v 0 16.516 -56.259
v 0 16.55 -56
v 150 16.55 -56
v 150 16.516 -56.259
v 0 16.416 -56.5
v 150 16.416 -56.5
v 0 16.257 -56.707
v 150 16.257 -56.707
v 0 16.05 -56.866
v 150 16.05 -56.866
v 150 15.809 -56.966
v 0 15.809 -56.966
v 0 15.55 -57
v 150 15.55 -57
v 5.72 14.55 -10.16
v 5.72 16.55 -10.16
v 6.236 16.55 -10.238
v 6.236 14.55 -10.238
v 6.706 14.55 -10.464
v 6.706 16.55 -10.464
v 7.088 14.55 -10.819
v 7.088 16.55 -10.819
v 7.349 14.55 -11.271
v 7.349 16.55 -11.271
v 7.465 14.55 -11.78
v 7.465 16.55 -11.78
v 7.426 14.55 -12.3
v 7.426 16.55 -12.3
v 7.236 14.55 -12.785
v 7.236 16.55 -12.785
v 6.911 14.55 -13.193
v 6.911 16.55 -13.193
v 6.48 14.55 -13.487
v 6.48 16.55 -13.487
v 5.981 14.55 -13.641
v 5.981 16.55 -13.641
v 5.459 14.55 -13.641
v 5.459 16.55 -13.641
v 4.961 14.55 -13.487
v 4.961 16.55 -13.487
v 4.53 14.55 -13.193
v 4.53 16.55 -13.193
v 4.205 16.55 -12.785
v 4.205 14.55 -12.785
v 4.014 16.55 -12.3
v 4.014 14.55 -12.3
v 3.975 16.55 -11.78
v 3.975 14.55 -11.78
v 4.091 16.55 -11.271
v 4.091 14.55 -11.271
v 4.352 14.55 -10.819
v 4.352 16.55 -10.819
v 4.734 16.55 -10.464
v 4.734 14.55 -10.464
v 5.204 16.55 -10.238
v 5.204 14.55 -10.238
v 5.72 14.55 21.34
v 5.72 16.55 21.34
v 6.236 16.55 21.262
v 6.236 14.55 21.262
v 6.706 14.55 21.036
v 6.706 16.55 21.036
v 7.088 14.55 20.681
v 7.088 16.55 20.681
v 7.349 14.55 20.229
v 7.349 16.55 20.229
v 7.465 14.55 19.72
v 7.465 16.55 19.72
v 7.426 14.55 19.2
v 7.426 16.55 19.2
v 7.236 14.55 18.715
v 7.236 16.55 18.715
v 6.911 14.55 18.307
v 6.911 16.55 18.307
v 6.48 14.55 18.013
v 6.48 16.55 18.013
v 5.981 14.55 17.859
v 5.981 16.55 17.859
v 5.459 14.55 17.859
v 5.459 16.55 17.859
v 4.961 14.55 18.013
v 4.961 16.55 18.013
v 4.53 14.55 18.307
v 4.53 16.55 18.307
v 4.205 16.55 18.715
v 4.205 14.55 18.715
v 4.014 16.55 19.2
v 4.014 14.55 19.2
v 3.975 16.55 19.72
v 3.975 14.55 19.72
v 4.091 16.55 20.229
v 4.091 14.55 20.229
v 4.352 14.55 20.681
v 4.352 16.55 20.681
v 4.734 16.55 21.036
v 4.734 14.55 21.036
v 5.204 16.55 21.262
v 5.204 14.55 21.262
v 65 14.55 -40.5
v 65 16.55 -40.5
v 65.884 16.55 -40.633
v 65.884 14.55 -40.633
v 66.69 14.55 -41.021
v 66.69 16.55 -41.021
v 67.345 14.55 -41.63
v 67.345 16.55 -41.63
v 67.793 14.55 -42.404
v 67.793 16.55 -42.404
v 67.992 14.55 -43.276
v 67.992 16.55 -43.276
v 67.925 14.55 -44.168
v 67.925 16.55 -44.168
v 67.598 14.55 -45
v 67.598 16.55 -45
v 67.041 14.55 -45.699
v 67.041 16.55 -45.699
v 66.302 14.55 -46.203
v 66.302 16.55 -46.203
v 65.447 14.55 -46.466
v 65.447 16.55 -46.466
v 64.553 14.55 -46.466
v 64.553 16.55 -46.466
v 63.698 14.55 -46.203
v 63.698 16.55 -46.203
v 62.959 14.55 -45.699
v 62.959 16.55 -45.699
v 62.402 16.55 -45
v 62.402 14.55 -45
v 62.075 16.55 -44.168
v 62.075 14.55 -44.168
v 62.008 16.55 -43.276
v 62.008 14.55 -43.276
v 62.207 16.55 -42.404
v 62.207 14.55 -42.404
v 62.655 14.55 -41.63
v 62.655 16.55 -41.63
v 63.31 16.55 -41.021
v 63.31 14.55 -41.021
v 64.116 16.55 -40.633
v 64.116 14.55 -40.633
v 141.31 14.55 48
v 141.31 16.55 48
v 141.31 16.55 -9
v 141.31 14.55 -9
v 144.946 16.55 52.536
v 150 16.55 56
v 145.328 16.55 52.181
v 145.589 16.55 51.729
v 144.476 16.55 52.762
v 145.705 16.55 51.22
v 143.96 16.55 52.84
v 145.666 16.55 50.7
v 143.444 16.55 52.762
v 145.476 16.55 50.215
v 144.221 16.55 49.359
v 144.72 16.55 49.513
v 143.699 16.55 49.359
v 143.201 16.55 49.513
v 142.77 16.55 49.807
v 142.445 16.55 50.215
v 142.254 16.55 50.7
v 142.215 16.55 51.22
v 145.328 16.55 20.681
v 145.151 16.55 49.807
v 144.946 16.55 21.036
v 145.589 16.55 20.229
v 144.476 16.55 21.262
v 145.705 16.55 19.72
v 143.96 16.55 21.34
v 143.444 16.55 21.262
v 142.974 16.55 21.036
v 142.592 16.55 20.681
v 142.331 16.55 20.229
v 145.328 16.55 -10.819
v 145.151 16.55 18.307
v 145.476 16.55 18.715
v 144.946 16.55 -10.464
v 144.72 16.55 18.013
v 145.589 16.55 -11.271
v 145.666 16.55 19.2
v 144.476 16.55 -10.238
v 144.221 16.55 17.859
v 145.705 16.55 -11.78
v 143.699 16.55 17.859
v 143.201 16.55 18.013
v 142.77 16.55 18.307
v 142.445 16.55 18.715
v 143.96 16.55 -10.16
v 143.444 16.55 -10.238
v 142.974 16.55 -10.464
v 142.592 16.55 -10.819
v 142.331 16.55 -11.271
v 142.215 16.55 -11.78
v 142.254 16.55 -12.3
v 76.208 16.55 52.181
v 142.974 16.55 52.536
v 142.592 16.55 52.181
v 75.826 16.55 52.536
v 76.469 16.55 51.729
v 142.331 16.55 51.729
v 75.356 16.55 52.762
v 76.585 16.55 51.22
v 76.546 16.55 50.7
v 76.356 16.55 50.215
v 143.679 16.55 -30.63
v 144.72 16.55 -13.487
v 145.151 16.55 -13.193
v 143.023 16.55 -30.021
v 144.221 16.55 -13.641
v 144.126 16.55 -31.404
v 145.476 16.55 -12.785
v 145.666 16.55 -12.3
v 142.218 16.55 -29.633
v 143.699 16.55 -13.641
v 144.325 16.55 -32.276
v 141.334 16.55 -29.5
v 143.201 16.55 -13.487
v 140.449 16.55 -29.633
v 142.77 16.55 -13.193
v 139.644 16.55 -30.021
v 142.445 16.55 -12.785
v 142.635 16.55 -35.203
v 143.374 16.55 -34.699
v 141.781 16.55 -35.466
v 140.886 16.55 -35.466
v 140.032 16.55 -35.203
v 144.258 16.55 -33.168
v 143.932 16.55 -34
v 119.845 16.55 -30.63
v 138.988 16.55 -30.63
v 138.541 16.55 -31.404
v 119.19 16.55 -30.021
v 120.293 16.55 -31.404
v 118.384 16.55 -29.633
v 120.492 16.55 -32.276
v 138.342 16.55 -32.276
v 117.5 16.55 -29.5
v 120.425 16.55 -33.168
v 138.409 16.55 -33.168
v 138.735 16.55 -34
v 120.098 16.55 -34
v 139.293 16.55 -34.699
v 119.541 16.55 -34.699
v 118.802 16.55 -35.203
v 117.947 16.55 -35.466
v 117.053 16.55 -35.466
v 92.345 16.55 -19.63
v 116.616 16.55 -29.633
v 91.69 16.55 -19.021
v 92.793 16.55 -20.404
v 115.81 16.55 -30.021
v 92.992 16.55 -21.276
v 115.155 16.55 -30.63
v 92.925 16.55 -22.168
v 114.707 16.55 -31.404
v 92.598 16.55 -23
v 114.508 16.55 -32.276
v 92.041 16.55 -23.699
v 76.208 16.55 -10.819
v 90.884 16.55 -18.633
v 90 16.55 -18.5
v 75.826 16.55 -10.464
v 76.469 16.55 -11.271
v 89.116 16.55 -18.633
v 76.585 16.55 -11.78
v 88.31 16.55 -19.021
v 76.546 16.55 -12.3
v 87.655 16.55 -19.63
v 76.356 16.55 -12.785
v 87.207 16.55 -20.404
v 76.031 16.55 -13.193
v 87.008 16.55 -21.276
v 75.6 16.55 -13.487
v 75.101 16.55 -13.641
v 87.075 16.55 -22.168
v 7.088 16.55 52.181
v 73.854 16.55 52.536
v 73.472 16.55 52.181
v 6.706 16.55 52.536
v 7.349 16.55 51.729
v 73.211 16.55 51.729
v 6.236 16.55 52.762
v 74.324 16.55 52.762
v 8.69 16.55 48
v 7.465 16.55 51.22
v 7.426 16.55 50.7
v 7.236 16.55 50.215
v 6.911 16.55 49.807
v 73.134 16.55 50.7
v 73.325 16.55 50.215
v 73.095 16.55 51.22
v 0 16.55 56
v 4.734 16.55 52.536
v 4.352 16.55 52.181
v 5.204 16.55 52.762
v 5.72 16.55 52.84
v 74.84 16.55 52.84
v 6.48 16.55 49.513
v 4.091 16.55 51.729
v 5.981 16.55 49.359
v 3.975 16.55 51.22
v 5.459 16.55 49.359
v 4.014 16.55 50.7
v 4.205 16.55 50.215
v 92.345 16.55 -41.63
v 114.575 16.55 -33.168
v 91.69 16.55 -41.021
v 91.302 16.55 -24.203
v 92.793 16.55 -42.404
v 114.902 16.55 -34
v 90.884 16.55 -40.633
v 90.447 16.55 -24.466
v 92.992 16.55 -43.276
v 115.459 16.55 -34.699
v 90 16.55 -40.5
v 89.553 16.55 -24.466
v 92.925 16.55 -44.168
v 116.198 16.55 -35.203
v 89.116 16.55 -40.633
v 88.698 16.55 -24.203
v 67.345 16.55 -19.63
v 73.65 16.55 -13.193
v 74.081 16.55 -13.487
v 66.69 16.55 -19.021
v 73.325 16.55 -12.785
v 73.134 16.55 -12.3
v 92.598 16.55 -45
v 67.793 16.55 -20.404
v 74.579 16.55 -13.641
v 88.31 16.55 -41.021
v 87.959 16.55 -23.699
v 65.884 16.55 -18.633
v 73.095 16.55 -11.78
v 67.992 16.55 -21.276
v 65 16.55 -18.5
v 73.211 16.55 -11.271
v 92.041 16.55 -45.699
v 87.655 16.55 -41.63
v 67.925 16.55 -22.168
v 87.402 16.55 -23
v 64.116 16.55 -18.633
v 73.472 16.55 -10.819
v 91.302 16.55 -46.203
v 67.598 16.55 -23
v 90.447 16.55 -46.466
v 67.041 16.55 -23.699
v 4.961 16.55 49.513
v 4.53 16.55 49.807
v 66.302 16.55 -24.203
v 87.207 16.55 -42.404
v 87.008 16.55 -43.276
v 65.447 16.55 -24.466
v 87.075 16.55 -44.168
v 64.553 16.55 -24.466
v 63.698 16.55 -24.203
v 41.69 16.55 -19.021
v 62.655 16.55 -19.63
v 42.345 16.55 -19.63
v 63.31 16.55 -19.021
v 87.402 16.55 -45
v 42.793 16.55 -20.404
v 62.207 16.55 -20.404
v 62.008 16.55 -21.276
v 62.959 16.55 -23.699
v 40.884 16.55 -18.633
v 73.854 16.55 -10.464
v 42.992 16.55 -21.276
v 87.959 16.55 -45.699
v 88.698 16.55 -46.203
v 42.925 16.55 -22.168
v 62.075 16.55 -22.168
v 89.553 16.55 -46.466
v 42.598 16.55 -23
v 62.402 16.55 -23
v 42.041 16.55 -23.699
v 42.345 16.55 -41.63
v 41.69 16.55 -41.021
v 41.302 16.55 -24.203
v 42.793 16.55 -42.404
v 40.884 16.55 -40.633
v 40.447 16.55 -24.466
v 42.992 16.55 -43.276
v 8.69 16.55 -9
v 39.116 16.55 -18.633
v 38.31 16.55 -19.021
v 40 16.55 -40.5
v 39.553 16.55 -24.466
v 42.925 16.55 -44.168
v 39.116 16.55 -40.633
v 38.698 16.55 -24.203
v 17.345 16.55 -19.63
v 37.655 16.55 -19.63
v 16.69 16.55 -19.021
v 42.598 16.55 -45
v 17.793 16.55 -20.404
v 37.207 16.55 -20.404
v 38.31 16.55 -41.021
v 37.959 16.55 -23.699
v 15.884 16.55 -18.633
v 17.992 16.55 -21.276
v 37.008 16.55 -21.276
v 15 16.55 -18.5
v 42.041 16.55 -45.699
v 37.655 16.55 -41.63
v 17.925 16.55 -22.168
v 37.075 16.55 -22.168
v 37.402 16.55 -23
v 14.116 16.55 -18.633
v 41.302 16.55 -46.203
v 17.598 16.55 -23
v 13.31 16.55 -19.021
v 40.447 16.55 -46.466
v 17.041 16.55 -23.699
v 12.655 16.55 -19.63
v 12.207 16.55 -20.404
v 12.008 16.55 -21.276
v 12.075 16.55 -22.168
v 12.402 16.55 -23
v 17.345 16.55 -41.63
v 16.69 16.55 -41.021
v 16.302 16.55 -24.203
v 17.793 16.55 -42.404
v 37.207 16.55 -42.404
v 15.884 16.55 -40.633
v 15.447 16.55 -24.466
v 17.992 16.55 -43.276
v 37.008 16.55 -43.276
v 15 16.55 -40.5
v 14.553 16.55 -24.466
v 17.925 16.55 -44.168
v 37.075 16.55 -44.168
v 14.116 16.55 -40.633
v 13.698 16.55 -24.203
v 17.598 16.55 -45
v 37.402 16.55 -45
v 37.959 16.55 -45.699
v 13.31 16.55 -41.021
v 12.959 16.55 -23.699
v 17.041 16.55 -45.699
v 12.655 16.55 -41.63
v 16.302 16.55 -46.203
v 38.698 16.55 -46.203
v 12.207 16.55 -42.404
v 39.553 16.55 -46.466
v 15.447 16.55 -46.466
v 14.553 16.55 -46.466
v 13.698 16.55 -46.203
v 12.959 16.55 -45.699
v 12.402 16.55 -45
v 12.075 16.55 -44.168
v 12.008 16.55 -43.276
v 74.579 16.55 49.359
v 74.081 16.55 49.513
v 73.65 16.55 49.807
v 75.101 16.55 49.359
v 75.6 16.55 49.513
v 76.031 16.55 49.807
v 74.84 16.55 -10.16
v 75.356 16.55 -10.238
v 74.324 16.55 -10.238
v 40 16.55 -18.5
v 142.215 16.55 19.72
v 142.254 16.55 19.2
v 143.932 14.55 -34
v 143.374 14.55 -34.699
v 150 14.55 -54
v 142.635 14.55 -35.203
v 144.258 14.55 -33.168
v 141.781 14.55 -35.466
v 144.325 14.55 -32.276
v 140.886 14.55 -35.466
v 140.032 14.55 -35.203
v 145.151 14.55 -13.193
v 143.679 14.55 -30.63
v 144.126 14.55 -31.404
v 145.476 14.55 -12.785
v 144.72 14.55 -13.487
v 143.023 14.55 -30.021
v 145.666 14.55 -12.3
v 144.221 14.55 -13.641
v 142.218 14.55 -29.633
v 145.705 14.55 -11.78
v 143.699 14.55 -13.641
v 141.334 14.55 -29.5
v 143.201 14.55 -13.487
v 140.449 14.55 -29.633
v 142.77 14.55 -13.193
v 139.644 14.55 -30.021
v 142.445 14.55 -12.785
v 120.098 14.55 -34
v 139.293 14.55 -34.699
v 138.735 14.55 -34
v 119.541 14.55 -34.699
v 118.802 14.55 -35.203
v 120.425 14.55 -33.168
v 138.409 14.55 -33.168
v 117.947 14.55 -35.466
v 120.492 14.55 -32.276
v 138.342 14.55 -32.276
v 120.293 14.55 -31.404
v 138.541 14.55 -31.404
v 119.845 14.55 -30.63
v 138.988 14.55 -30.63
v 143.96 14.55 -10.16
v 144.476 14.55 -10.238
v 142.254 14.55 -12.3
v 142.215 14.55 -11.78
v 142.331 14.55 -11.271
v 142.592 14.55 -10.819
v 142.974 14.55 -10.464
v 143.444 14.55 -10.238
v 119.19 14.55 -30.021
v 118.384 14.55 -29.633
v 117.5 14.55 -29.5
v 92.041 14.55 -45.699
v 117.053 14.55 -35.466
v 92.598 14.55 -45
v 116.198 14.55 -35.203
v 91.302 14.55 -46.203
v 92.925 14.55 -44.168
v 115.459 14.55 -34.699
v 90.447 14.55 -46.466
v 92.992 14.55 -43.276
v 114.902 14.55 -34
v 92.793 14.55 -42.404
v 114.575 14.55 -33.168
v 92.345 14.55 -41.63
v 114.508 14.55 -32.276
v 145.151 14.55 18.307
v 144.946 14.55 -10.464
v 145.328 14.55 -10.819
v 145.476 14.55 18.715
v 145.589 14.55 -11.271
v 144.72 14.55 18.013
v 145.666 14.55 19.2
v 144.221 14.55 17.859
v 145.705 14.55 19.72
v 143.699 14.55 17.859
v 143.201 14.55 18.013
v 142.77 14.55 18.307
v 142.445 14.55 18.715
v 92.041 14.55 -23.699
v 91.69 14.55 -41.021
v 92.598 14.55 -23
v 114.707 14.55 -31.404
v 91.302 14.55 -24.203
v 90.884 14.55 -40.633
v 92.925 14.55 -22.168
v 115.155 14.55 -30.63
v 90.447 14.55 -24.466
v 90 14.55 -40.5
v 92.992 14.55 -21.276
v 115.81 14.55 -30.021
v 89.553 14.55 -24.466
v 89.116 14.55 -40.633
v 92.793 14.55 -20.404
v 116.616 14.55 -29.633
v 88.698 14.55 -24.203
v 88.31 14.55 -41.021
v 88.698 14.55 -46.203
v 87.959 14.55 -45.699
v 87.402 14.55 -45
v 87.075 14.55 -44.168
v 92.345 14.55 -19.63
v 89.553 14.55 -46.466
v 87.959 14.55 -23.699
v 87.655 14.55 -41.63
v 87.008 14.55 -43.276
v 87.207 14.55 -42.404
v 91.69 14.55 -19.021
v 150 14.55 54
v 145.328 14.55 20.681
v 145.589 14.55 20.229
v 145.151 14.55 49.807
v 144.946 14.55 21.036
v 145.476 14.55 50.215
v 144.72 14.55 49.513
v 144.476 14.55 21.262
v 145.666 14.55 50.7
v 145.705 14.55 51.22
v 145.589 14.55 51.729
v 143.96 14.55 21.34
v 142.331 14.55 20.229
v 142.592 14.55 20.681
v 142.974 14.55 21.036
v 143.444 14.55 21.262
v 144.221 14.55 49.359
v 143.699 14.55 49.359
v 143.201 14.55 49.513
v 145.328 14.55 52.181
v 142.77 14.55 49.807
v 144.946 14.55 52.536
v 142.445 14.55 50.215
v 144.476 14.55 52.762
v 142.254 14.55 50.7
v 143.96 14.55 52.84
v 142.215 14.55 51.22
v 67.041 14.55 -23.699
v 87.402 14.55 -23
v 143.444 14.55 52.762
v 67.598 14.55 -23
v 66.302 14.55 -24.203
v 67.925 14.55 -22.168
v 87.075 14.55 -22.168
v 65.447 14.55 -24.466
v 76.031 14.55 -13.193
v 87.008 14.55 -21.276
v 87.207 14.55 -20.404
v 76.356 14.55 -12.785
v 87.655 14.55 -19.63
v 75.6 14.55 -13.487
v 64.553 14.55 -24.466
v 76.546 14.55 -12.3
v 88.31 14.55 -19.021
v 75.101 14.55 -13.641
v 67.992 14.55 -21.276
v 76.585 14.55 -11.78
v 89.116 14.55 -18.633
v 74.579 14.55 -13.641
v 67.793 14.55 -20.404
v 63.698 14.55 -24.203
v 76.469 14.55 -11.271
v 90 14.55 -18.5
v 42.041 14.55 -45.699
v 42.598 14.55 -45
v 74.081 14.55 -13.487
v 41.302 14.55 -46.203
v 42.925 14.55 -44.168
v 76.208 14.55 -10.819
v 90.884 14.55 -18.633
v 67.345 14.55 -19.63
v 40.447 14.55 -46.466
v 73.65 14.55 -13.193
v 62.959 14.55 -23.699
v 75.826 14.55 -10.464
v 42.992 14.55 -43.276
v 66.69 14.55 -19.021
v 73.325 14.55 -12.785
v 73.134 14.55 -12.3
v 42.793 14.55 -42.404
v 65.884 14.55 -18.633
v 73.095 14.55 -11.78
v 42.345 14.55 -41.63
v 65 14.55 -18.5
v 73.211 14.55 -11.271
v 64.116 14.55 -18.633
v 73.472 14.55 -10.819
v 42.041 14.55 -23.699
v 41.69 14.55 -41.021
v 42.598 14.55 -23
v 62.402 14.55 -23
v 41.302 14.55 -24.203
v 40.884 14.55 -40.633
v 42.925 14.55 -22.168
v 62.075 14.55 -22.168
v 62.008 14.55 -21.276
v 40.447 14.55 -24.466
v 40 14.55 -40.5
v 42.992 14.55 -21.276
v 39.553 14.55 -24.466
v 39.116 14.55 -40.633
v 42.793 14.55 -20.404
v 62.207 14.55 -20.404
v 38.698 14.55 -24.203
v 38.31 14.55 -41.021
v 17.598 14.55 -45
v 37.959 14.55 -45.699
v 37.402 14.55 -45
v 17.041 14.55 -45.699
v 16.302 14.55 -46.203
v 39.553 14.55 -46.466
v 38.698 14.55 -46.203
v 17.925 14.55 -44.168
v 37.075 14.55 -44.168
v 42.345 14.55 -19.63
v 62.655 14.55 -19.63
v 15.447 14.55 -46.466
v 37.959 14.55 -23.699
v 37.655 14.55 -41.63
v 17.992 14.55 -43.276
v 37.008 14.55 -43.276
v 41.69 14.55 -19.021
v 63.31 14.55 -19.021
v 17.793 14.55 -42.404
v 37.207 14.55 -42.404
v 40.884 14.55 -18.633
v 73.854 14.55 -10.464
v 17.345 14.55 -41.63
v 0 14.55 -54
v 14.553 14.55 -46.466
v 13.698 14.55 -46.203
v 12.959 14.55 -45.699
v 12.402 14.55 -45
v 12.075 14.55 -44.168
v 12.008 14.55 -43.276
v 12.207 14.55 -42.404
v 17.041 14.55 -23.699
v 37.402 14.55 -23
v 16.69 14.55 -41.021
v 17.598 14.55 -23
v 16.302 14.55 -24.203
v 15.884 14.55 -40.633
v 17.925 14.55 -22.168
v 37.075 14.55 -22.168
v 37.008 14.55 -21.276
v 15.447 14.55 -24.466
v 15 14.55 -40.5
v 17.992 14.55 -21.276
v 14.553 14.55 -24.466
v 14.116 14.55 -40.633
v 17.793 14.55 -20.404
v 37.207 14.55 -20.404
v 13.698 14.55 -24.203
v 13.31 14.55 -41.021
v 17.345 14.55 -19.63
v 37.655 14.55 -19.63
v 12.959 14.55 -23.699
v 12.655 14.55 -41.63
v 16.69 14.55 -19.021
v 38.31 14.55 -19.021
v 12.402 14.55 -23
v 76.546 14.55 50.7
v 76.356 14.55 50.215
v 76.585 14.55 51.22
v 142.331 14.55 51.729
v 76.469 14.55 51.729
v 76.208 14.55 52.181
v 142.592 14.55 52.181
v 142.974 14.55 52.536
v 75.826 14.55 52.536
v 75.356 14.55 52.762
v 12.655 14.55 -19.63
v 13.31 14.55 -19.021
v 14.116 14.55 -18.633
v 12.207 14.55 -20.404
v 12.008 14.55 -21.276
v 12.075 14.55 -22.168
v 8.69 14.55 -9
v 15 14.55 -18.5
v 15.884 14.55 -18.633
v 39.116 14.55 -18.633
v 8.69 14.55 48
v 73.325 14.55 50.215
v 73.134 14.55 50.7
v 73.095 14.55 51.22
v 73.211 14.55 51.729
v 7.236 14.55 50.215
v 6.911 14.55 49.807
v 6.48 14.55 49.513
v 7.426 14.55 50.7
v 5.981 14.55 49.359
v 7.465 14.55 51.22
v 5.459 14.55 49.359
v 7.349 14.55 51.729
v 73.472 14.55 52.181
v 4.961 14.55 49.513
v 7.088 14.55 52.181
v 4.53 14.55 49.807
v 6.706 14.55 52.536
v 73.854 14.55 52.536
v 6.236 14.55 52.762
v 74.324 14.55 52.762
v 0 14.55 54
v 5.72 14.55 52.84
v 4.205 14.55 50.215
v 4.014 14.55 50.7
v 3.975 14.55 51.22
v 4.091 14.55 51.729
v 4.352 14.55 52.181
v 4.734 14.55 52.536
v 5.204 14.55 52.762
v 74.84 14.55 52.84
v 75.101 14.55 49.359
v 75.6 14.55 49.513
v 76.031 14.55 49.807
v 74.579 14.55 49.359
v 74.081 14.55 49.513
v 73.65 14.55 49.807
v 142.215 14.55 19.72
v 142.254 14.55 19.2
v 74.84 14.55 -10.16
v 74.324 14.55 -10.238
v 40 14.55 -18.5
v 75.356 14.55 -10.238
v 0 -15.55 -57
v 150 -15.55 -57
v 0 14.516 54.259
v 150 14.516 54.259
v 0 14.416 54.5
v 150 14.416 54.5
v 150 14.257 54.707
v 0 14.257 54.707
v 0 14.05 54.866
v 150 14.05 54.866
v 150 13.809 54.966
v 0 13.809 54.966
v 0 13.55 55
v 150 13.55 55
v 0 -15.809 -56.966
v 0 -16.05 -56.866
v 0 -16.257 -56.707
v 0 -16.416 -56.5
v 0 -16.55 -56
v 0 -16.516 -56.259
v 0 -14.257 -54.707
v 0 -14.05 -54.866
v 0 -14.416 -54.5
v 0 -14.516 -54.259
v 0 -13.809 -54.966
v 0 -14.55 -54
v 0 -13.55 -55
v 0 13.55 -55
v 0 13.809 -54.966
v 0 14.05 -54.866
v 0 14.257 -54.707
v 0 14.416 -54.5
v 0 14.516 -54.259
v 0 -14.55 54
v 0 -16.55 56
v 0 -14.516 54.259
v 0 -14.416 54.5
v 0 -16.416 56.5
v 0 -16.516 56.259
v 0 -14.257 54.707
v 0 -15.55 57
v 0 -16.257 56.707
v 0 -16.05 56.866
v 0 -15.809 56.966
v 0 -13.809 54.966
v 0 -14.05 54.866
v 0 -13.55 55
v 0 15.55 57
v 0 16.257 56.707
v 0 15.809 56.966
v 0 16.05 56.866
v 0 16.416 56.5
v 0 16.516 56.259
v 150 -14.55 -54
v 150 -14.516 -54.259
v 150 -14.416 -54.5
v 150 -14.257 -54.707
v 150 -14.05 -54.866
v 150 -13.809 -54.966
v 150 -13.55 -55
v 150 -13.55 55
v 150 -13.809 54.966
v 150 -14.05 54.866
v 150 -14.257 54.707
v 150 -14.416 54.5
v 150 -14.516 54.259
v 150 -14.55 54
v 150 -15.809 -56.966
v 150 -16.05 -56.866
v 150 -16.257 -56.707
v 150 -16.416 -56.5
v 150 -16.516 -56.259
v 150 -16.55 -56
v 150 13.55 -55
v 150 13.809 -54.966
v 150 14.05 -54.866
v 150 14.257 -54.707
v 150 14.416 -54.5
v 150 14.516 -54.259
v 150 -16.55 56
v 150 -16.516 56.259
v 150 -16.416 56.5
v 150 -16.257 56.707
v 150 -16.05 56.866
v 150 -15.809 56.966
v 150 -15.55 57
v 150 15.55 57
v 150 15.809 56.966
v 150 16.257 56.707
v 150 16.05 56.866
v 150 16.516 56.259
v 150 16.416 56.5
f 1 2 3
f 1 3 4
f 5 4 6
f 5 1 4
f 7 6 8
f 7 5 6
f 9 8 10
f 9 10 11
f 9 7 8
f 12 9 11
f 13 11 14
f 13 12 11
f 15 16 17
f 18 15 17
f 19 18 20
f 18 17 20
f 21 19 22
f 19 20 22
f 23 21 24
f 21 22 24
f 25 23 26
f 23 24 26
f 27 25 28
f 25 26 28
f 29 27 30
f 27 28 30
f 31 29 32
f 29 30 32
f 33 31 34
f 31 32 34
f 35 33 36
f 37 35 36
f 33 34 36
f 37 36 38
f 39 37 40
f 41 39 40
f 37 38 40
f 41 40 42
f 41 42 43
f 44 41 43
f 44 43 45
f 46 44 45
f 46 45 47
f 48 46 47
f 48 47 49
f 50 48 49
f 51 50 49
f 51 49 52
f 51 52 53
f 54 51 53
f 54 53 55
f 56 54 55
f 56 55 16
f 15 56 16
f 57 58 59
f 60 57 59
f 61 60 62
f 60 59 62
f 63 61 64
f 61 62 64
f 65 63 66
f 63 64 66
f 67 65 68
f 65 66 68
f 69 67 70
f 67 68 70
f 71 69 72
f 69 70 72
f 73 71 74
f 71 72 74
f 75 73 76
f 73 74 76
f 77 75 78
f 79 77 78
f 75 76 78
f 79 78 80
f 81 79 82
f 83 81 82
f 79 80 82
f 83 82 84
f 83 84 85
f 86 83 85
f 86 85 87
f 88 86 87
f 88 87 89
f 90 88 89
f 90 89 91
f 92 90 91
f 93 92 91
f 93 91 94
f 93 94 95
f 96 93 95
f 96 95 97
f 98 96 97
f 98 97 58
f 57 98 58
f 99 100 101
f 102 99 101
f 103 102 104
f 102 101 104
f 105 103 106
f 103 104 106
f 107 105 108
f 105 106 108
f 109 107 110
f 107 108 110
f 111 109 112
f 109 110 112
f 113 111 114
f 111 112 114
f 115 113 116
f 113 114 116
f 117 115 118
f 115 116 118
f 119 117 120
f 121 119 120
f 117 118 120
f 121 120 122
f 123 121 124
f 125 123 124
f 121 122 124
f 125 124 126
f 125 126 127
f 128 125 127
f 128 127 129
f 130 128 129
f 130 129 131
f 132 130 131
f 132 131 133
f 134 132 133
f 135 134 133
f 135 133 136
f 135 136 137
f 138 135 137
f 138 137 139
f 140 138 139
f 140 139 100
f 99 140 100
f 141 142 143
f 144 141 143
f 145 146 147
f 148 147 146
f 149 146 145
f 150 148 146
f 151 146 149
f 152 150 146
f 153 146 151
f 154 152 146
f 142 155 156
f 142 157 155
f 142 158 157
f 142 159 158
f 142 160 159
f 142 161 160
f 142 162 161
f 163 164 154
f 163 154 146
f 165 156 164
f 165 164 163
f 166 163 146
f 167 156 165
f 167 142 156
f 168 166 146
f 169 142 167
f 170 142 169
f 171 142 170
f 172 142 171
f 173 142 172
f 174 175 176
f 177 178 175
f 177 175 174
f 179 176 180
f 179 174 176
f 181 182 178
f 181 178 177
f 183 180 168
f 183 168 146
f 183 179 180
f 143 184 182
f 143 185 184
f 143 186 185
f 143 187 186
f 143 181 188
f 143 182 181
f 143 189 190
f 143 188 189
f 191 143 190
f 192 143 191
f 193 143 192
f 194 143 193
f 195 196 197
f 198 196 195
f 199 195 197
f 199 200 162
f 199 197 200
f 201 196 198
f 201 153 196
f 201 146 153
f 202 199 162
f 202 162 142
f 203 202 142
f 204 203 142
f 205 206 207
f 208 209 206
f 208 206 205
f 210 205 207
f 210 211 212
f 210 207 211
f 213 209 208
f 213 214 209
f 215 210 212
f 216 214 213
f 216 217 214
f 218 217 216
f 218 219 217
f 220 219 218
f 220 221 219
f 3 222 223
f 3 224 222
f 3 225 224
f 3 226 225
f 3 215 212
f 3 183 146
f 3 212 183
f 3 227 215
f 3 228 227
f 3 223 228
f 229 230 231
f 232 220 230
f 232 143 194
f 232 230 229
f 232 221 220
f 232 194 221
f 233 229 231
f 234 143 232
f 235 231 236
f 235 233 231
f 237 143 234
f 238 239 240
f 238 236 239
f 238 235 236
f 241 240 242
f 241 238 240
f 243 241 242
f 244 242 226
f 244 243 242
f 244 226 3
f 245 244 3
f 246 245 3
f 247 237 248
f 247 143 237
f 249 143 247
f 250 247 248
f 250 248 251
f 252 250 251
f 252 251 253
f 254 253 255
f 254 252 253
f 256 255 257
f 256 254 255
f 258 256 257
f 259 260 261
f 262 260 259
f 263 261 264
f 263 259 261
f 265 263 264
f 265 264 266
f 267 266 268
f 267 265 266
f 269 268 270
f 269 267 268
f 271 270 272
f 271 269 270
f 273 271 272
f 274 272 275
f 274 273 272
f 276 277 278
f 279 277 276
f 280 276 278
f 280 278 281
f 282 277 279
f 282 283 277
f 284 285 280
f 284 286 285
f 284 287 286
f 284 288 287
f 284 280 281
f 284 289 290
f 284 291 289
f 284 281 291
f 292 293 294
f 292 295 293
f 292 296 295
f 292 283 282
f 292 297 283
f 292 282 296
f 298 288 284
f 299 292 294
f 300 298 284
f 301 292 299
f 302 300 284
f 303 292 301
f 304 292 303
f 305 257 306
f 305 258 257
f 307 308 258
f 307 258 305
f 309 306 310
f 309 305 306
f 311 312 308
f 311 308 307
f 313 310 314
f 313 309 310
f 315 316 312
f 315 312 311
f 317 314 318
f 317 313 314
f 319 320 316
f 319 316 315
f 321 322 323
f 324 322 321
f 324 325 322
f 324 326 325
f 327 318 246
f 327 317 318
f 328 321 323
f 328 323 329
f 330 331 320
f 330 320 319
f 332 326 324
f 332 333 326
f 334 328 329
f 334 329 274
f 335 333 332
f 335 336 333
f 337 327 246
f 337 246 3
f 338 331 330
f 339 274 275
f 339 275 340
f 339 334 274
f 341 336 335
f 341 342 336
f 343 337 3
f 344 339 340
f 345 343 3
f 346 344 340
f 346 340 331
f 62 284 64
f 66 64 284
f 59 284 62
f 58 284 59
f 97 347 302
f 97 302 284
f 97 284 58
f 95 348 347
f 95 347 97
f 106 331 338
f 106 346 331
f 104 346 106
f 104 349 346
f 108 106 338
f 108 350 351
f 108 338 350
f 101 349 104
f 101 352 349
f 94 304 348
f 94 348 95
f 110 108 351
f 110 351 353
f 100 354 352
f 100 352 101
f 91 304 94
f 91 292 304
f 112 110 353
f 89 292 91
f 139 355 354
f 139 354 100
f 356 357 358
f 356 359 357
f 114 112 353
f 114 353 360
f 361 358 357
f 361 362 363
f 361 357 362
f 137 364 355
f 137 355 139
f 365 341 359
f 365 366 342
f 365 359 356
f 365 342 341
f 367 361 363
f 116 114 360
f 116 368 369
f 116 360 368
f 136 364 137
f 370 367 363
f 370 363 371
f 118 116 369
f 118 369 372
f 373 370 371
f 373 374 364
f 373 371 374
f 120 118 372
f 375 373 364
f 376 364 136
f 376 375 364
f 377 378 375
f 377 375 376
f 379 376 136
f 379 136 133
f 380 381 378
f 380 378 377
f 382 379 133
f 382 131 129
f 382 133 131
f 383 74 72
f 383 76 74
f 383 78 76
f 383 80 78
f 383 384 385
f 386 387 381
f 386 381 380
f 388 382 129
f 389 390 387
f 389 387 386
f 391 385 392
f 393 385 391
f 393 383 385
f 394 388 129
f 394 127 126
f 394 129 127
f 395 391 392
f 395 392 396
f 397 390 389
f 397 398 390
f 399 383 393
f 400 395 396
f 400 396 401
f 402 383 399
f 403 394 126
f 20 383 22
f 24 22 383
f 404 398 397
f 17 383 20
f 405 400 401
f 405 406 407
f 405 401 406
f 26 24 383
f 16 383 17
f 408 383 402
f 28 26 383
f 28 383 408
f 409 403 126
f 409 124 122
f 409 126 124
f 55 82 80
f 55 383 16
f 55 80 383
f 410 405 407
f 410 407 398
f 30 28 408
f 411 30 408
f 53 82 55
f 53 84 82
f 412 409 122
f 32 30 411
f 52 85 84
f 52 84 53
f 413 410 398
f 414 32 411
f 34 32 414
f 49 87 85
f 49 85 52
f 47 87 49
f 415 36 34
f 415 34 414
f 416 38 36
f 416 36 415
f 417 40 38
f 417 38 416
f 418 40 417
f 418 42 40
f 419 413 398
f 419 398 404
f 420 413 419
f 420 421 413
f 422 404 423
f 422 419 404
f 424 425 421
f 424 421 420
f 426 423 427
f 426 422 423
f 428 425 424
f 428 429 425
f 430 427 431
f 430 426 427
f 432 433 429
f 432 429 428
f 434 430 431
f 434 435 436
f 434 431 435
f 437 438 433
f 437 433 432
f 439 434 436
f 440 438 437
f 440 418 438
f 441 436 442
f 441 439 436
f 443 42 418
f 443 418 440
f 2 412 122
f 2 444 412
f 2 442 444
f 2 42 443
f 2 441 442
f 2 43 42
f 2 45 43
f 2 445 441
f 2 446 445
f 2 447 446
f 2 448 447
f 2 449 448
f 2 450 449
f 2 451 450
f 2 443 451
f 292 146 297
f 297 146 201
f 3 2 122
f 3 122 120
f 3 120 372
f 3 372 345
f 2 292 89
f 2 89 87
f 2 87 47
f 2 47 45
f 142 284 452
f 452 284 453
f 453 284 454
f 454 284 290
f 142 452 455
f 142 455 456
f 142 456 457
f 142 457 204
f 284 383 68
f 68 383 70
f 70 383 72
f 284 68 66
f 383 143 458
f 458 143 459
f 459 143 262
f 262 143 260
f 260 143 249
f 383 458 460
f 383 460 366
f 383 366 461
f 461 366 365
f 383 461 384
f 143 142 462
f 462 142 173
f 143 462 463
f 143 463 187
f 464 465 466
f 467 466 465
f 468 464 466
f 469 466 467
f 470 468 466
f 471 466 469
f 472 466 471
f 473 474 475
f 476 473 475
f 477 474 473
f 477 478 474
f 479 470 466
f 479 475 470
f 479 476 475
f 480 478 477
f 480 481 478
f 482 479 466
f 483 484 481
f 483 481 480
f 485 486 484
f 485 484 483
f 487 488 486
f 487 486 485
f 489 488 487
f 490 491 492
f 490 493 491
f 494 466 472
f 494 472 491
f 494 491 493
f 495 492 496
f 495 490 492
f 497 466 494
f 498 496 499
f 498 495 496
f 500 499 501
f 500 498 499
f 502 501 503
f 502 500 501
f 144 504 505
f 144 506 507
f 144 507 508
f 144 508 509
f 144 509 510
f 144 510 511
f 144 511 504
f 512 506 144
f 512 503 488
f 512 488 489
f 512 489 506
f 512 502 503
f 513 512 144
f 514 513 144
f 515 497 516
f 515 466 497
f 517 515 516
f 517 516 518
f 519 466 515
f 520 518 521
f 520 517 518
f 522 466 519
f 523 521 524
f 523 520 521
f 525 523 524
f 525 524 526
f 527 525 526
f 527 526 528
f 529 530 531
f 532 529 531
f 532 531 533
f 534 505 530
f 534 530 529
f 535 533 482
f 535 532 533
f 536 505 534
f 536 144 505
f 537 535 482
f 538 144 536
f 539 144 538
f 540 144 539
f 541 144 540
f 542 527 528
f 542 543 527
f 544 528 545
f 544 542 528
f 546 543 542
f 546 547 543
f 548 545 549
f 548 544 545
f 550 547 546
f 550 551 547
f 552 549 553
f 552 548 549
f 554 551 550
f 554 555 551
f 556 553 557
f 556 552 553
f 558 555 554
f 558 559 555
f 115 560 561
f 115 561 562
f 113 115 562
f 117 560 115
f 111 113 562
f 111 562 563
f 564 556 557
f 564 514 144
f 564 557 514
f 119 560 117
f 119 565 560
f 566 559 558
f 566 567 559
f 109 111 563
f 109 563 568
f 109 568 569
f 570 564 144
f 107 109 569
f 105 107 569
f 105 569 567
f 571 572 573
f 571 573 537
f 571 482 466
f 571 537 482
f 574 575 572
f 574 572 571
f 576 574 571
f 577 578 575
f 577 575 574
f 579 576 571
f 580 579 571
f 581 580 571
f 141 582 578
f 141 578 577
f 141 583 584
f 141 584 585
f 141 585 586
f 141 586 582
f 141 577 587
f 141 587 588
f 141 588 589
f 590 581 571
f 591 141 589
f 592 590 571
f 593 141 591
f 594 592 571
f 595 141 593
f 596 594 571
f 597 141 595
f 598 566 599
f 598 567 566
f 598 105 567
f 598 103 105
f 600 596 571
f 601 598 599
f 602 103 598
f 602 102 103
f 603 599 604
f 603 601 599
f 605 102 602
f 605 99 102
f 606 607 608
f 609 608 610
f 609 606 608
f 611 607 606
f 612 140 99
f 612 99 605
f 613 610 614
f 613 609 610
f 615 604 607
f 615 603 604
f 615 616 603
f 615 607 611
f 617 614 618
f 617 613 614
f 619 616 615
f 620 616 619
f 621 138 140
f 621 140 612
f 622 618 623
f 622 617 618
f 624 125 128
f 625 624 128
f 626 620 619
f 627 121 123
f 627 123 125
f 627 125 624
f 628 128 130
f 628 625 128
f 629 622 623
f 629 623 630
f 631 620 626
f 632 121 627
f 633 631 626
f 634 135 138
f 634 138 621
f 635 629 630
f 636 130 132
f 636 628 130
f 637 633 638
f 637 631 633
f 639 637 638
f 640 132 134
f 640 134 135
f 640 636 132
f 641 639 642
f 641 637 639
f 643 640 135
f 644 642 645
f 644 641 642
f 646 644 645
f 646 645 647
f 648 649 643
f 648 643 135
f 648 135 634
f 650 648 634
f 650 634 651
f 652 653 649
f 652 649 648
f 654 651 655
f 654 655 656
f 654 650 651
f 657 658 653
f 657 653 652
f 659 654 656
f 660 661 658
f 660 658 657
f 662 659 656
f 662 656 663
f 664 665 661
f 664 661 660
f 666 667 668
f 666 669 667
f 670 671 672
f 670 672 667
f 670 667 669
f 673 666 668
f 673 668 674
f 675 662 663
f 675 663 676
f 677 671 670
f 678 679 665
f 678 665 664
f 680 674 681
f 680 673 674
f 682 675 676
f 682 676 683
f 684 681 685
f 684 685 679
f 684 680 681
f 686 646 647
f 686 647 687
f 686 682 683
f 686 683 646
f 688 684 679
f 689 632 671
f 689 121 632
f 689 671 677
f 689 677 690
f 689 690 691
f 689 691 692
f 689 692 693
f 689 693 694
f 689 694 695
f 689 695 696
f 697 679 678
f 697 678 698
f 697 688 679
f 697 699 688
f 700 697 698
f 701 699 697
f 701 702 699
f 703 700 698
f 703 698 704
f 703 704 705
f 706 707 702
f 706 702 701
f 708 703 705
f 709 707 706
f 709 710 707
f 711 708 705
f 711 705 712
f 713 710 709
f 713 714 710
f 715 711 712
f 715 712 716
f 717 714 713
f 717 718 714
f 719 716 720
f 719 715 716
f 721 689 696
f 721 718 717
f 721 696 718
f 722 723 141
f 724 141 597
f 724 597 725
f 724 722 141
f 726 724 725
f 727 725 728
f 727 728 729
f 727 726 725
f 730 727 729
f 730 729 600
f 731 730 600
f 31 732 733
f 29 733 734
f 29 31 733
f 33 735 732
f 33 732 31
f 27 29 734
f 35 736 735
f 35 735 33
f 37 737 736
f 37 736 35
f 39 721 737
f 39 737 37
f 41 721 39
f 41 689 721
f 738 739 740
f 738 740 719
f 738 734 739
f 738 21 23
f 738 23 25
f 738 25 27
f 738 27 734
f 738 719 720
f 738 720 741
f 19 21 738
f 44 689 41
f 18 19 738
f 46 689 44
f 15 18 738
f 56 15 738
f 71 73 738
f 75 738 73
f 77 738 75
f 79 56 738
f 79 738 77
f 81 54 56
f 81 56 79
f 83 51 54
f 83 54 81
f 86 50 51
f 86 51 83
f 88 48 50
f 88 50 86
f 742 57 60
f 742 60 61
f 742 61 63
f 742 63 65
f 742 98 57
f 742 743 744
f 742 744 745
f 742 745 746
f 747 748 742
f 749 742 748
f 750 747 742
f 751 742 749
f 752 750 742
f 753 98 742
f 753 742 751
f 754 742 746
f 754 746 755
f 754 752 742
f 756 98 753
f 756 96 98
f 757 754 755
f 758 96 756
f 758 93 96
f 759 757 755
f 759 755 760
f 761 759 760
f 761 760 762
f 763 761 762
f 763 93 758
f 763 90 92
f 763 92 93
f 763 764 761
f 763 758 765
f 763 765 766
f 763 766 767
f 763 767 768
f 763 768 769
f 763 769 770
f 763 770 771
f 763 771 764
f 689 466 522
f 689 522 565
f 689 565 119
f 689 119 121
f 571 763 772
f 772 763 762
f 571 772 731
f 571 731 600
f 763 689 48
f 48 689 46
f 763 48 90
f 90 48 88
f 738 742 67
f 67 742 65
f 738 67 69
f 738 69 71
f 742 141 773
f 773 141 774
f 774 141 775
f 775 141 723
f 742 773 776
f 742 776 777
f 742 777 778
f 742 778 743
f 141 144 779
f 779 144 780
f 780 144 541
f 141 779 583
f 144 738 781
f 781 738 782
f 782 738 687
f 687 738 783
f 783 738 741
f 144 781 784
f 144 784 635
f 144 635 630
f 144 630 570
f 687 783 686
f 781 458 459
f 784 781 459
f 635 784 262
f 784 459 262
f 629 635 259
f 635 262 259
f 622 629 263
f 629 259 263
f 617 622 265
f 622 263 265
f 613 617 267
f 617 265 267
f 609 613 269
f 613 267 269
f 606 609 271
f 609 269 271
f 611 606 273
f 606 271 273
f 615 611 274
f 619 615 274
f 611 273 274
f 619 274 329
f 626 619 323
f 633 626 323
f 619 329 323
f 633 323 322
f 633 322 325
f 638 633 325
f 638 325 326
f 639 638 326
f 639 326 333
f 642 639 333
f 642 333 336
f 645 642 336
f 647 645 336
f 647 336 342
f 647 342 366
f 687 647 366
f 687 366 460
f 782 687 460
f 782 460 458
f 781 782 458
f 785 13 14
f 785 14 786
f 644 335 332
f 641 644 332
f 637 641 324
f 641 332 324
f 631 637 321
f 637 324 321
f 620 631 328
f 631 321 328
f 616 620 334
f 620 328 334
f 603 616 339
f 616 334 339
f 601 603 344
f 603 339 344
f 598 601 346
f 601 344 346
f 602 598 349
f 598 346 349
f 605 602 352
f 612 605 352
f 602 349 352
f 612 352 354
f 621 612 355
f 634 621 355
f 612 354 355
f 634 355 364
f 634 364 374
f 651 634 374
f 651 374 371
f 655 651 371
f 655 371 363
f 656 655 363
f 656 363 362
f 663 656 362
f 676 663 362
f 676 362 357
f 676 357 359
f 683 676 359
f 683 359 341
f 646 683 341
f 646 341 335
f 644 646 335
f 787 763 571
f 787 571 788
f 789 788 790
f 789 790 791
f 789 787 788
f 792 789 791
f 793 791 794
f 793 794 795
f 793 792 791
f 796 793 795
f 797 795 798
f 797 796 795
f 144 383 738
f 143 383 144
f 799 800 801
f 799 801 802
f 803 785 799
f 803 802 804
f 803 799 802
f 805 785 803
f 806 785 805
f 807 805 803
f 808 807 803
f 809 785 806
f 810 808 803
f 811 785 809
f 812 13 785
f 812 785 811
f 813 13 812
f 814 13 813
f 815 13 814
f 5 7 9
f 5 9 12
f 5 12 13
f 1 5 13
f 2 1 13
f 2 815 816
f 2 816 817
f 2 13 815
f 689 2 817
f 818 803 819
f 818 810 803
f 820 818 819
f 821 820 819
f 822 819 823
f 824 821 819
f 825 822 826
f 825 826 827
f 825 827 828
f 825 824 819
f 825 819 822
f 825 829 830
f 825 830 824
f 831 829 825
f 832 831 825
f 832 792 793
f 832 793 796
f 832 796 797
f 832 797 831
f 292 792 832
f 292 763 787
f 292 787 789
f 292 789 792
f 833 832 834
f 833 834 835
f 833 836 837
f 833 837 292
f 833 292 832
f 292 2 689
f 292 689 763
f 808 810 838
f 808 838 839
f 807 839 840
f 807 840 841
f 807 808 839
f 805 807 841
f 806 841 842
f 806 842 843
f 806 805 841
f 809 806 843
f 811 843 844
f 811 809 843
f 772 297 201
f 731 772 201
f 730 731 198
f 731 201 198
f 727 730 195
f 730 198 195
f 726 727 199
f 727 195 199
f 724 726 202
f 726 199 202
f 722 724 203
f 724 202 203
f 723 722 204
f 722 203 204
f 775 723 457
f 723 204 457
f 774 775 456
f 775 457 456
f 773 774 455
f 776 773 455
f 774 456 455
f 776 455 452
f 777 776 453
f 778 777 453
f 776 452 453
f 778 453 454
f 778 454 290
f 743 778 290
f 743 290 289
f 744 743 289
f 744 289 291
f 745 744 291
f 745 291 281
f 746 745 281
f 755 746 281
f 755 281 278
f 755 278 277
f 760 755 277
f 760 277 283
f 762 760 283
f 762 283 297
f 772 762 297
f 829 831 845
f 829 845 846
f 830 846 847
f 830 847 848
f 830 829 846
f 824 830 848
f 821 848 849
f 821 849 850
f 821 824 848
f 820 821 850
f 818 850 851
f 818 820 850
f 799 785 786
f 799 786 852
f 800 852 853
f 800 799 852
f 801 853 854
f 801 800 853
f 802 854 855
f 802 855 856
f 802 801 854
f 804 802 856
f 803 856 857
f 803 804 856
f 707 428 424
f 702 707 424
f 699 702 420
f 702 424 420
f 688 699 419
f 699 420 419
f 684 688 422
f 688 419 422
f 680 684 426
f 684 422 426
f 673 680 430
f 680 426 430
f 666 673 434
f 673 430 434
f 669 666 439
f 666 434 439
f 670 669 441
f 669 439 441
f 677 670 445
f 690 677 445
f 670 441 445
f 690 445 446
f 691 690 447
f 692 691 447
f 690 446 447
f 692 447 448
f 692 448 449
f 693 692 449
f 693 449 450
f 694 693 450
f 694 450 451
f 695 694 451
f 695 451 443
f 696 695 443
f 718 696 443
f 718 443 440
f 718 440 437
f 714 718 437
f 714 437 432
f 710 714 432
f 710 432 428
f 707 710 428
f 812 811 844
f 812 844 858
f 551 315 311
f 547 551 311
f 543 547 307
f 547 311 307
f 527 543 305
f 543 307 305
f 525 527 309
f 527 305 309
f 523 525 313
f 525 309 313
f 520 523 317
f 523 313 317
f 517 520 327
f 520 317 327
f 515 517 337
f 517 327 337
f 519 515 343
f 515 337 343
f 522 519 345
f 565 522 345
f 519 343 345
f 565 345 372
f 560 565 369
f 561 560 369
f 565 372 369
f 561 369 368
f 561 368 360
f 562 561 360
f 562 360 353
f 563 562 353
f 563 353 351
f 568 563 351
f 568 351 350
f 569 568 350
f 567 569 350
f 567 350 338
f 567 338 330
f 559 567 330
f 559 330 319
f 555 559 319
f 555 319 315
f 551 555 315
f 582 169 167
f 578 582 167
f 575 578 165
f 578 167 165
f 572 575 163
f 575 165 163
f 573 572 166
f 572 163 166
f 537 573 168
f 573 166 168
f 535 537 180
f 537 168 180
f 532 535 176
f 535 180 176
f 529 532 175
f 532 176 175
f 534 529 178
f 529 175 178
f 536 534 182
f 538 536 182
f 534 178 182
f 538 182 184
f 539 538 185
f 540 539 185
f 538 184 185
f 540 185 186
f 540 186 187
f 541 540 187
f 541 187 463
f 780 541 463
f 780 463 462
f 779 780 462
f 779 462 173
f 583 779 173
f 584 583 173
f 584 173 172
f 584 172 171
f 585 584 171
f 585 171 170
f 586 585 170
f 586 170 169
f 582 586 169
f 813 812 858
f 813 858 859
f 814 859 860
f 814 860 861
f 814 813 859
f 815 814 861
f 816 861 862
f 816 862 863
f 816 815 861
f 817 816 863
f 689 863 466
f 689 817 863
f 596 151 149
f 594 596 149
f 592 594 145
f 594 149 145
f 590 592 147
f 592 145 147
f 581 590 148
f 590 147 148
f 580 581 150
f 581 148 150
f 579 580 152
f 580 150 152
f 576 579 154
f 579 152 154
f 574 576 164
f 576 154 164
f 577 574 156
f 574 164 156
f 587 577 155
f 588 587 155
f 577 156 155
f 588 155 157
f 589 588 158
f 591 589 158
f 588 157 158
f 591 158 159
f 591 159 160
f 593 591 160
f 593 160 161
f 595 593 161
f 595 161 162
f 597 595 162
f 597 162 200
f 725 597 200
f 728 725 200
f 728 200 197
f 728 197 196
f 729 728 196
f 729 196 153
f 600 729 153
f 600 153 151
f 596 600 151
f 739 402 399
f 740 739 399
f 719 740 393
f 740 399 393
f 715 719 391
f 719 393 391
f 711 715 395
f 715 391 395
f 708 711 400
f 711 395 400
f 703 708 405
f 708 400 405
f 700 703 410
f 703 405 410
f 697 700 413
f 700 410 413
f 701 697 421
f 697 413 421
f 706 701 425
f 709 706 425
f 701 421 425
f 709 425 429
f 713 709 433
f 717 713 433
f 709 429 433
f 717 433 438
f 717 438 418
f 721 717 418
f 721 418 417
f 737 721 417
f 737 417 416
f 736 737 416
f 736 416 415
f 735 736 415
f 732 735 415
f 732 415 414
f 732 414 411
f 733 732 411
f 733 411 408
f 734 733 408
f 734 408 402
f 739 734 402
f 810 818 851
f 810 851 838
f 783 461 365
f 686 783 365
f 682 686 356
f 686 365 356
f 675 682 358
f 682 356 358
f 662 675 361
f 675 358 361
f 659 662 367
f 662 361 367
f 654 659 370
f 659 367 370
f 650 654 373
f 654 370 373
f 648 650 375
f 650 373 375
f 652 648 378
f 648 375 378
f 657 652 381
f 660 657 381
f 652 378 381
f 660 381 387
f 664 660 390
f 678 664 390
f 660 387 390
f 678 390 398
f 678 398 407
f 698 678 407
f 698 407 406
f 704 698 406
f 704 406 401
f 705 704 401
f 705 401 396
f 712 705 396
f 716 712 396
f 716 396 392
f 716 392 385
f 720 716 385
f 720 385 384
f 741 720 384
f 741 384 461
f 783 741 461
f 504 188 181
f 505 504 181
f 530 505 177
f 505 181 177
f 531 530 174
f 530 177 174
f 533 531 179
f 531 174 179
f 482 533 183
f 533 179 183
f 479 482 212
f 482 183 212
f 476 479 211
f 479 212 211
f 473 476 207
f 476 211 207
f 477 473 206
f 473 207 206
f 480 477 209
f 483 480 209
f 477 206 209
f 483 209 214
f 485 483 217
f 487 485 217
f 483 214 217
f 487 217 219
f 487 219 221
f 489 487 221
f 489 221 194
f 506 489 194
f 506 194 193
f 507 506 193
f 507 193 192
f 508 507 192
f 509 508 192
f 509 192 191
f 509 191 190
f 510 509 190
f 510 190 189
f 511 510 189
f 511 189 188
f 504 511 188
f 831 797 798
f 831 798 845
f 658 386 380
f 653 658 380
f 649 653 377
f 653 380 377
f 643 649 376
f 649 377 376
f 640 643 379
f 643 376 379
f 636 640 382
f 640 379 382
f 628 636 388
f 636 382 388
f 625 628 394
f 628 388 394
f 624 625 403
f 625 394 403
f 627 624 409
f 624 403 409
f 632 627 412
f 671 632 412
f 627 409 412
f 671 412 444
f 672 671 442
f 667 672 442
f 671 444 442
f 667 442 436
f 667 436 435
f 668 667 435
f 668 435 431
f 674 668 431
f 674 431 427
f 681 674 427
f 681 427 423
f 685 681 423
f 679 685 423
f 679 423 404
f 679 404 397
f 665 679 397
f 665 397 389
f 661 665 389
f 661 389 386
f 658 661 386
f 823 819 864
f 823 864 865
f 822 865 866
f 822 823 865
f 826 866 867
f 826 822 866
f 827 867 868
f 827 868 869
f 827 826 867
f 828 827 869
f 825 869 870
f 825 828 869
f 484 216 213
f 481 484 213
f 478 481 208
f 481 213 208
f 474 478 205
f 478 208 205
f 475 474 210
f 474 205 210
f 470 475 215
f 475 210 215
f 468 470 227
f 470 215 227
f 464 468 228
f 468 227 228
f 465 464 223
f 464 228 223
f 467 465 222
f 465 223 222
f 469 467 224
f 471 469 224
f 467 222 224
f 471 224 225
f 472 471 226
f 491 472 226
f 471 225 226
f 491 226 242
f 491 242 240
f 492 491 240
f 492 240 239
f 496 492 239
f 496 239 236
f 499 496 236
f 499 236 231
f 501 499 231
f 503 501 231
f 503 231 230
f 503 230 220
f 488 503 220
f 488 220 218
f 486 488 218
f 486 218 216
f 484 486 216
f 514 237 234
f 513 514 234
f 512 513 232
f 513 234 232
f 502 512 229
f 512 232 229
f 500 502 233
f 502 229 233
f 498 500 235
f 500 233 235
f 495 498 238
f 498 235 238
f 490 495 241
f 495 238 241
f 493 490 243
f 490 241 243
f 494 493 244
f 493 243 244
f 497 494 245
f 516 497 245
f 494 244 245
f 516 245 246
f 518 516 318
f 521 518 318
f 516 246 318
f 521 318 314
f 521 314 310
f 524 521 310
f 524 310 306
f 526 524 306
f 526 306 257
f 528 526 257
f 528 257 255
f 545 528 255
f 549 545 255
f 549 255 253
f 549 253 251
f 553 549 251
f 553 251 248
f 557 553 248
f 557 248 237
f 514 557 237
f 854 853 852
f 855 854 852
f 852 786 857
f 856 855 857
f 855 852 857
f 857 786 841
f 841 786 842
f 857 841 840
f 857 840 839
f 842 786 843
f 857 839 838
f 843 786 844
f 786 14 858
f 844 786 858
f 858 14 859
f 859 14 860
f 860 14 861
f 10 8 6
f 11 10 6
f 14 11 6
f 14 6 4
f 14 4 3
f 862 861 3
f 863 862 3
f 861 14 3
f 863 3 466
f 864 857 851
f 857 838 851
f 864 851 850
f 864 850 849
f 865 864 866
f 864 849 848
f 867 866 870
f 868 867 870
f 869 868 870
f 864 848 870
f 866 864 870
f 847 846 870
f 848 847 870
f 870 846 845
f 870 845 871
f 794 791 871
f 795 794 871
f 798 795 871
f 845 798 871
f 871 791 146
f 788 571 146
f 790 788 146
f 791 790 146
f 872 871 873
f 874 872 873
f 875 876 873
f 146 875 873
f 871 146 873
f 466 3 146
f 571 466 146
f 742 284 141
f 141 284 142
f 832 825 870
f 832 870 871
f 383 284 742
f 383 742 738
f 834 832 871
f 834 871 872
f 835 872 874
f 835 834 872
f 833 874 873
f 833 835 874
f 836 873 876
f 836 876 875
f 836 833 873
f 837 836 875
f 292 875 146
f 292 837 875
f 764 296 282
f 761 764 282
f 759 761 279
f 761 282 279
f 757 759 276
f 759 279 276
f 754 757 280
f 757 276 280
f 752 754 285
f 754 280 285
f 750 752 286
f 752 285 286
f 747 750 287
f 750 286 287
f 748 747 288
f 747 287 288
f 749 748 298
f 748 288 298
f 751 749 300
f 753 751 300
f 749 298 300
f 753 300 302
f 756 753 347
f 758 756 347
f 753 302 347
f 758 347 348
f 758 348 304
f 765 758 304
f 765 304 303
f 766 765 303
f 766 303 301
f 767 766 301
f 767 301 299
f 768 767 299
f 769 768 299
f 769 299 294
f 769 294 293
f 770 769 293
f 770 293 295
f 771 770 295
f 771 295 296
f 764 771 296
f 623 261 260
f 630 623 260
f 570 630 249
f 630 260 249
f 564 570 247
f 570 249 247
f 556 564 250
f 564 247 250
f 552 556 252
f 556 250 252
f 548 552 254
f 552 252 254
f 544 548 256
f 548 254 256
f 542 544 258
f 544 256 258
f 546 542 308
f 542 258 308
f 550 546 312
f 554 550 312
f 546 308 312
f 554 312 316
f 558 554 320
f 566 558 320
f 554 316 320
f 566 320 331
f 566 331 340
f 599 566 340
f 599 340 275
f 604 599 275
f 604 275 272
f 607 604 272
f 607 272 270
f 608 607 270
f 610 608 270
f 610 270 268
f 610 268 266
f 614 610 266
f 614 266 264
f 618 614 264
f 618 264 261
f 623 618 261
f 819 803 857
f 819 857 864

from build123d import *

# Parameters (mm, degrees)
BOSS_EXTRUDE7_DEPTH = 150
CUT_EXTRUDE3_DEPTH  = 150
SKETCH25_W          = 132.62
SKETCH25_H          = 57
CUT_EXTRUDE4_DEPTH  = 2
SKETCH26_R          = 3
SKETCH26_R_2        = 1.75
CUT_EXTRUDE5_DEPTH  = 10


with BuildPart() as part:
    # Sketch23 → Boss-Extrude7 (new body)
    with BuildSketch(Plane(origin=(0, 0, 0), x_dir=(0, 0, -1), z_dir=(1, 0, 0))):
        with BuildLine():
            Line((-56, 16.55), (56, 16.55))
            ThreePointArc((56, 16.55), (56.707106781, 16.257106781), (57, 15.55))
            Line((57, 15.55), (57, -15.55))
            ThreePointArc((57, -15.55), (56.707106781, -16.257106781), (56, -16.55))
            Line((56, -16.55), (-56, -16.55))
            ThreePointArc((-56, -16.55), (-56.707106781, -16.257106781), (-57, -15.55))
            Line((-57, -15.55), (-57, 15.55))
            ThreePointArc((-57, 15.55), (-56.707106781, 16.257106781), (-56, 16.55))
        make_face()
    extrude(amount=BOSS_EXTRUDE7_DEPTH)

    # Sketch24 → Cut-Extrude3 (cut)
    with BuildSketch(Plane.ZY):
        with BuildLine():
            Line((54, -14.55), (-54, -14.55))
            ThreePointArc((-54, -14.55), (-54.707106781, -14.257106781), (-55, -13.55))
            Line((-55, -13.55), (-55, 13.55))
            ThreePointArc((-55, 13.55), (-54.707106781, 14.257106781), (-54, 14.55))
            Line((-54, 14.55), (54, 14.55))
            ThreePointArc((54, 14.55), (54.707106781, 14.257106781), (55, 13.55))
            Line((55, 13.55), (55, -13.55))
            ThreePointArc((55, -13.55), (54.707106781, -14.257106781), (54, -14.55))
        make_face()
    extrude(amount=-CUT_EXTRUDE3_DEPTH, mode=Mode.SUBTRACT)

    # Sketch25 → Cut-Extrude4 (cut)
    with BuildSketch(Plane(origin=(0, 16.55, 0), x_dir=(1, 0, 0), z_dir=(0, 1, 0))):
        with Locations((75, -19.5)):
            Rectangle(SKETCH25_W, SKETCH25_H)
    extrude(amount=-CUT_EXTRUDE4_DEPTH, mode=Mode.SUBTRACT)

    # Sketch26 → Cut-Extrude5 (cut)
    with BuildSketch(Plane(origin=(0, 16.55, 0), x_dir=(1, 0, 0), z_dir=(0, 1, 0))):
        with Locations(Location((15, 43.5, 0), (0, 0, 270))):
            Circle(SKETCH26_R)
        with Locations(Location((15, 21.5, 0), (0, 0, 270))):
            Circle(SKETCH26_R)
        with Locations(Location((40, 43.5, 0), (0, 0, 270))):
            Circle(SKETCH26_R)
        with Locations(Location((40, 21.5, 0), (0, 0, 270))):
            Circle(SKETCH26_R)
        with Locations(Location((65, 43.5, 0), (0, 0, 270))):
            Circle(SKETCH26_R)
        with Locations(Location((65, 21.5, 0), (0, 0, 270))):
            Circle(SKETCH26_R)
        with Locations(Location((90, 43.5, 0), (0, 0, 270))):
            Circle(SKETCH26_R)
        with Locations(Location((90, 21.5, 0), (0, 0, 270))):
            Circle(SKETCH26_R)
        with Locations(Location((74.840255535, 11.91029543, 0), (0, 0, 270))):
            Circle(SKETCH26_R_2)
        with Locations(Location((5.720255535, 11.91029543, 0), (0, 0, 270))):
            Circle(SKETCH26_R_2)
        with Locations(Location((5.720255535, -19.58970457, 0), (0, 0, 270))):
            Circle(SKETCH26_R_2)
        with Locations(Location((5.720255535, -51.08970457, 0), (0, 0, 270))):
            Circle(SKETCH26_R_2)
        with Locations(Location((74.840255535, -51.08970457, 0), (0, 0, 270))):
            Circle(SKETCH26_R_2)
        with Locations(Location((143.960255535, -51.08970457, 0), (0, 0, 270))):
            Circle(SKETCH26_R_2)
        with Locations(Location((143.960255535, -19.58970457, 0), (0, 0, 270))):
            Circle(SKETCH26_R_2)
        with Locations(Location((143.960255535, 11.91029543, 0), (0, 0, 270))):
            Circle(SKETCH26_R_2)
        with Locations(Location((117.5, 32.5, 0), (0, 0, 270))):
            Circle(SKETCH26_R)
        with Locations(Location((141.333516057, 32.5, 0), (0, 0, 270))):
            Circle(SKETCH26_R)
    extrude(amount=-CUT_EXTRUDE5_DEPTH, mode=Mode.SUBTRACT)


solid = part.part
